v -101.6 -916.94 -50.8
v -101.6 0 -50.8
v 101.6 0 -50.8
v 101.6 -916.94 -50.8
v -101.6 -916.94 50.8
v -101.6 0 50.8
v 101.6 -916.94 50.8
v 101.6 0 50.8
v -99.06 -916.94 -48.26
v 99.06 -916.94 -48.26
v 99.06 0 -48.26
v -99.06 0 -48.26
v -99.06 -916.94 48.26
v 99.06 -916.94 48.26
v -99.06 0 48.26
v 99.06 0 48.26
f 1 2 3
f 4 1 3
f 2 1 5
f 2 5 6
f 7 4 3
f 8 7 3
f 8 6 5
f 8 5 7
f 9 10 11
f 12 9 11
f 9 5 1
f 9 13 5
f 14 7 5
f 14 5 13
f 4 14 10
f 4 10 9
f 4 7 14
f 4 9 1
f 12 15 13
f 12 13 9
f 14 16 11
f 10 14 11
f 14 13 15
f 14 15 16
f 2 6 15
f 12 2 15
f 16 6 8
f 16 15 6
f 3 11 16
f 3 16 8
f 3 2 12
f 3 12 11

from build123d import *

# Parameters (mm, degrees)
SKETCH1_W           = 203.2
SKETCH1_H           = 101.6
SKETCH1_W_2         = 198.12
SKETCH1_H_2         = 96.52
BOSS_EXTRUDE1_DEPTH = 1526.54
SKETCH2_W           = 99.06
SKETCH2_H           = 609.6
CUT_EXTRUDE1_DEPTH  = 1541.842383763
SKETCH3_W           = 203.2
SKETCH3_H           = 2.54
BOSS_EXTRUDE2_DEPTH = 101.6
CUT_EXTRUDE2_DEPTH  = 1541.928216109


with BuildPart() as part:
    # Sketch1 → Boss-Extrude1 (new body)
    with BuildSketch(Plane(origin=(0, 0, 0), x_dir=(1, 0, 0), z_dir=(0, 1, 0))):
        Rectangle(SKETCH1_W, SKETCH1_H)
        Rectangle(SKETCH1_W_2, SKETCH1_H_2, mode=Mode.SUBTRACT)
    extrude(amount=-BOSS_EXTRUDE1_DEPTH)

    # Sketch2 → Cut-Extrude1 (cut, through all)
    with BuildSketch(Plane(origin=(101.6, 0, 0), x_dir=(0, 0, -1), z_dir=(1, 0, 0))):
        with Locations((-1.27, -1221.74)):
            Rectangle(SKETCH2_W, SKETCH2_H)
    extrude(amount=-CUT_EXTRUDE1_DEPTH, mode=Mode.SUBTRACT)

    # Sketch3 → Boss-Extrude2 (add)
    with BuildSketch(Plane.XY.offset(-48.26)):
        with Locations((0, -1525.27)):
            Rectangle(SKETCH3_W, SKETCH3_H)
    extrude(amount=BOSS_EXTRUDE2_DEPTH)

    # Sketch4 → Cut-Extrude2 (cut, through all)
    with BuildSketch(Plane.ZY.offset(101.6)):
        Polygon((-48.26, -916.94), (-50.8, -916.94), (-50.8, -1526.54), (53.34, -1526.54), (53.34, -1524), (-48.26, -1524), align=None)
    extrude(amount=-CUT_EXTRUDE2_DEPTH, mode=Mode.SUBTRACT)


solid = part.part
